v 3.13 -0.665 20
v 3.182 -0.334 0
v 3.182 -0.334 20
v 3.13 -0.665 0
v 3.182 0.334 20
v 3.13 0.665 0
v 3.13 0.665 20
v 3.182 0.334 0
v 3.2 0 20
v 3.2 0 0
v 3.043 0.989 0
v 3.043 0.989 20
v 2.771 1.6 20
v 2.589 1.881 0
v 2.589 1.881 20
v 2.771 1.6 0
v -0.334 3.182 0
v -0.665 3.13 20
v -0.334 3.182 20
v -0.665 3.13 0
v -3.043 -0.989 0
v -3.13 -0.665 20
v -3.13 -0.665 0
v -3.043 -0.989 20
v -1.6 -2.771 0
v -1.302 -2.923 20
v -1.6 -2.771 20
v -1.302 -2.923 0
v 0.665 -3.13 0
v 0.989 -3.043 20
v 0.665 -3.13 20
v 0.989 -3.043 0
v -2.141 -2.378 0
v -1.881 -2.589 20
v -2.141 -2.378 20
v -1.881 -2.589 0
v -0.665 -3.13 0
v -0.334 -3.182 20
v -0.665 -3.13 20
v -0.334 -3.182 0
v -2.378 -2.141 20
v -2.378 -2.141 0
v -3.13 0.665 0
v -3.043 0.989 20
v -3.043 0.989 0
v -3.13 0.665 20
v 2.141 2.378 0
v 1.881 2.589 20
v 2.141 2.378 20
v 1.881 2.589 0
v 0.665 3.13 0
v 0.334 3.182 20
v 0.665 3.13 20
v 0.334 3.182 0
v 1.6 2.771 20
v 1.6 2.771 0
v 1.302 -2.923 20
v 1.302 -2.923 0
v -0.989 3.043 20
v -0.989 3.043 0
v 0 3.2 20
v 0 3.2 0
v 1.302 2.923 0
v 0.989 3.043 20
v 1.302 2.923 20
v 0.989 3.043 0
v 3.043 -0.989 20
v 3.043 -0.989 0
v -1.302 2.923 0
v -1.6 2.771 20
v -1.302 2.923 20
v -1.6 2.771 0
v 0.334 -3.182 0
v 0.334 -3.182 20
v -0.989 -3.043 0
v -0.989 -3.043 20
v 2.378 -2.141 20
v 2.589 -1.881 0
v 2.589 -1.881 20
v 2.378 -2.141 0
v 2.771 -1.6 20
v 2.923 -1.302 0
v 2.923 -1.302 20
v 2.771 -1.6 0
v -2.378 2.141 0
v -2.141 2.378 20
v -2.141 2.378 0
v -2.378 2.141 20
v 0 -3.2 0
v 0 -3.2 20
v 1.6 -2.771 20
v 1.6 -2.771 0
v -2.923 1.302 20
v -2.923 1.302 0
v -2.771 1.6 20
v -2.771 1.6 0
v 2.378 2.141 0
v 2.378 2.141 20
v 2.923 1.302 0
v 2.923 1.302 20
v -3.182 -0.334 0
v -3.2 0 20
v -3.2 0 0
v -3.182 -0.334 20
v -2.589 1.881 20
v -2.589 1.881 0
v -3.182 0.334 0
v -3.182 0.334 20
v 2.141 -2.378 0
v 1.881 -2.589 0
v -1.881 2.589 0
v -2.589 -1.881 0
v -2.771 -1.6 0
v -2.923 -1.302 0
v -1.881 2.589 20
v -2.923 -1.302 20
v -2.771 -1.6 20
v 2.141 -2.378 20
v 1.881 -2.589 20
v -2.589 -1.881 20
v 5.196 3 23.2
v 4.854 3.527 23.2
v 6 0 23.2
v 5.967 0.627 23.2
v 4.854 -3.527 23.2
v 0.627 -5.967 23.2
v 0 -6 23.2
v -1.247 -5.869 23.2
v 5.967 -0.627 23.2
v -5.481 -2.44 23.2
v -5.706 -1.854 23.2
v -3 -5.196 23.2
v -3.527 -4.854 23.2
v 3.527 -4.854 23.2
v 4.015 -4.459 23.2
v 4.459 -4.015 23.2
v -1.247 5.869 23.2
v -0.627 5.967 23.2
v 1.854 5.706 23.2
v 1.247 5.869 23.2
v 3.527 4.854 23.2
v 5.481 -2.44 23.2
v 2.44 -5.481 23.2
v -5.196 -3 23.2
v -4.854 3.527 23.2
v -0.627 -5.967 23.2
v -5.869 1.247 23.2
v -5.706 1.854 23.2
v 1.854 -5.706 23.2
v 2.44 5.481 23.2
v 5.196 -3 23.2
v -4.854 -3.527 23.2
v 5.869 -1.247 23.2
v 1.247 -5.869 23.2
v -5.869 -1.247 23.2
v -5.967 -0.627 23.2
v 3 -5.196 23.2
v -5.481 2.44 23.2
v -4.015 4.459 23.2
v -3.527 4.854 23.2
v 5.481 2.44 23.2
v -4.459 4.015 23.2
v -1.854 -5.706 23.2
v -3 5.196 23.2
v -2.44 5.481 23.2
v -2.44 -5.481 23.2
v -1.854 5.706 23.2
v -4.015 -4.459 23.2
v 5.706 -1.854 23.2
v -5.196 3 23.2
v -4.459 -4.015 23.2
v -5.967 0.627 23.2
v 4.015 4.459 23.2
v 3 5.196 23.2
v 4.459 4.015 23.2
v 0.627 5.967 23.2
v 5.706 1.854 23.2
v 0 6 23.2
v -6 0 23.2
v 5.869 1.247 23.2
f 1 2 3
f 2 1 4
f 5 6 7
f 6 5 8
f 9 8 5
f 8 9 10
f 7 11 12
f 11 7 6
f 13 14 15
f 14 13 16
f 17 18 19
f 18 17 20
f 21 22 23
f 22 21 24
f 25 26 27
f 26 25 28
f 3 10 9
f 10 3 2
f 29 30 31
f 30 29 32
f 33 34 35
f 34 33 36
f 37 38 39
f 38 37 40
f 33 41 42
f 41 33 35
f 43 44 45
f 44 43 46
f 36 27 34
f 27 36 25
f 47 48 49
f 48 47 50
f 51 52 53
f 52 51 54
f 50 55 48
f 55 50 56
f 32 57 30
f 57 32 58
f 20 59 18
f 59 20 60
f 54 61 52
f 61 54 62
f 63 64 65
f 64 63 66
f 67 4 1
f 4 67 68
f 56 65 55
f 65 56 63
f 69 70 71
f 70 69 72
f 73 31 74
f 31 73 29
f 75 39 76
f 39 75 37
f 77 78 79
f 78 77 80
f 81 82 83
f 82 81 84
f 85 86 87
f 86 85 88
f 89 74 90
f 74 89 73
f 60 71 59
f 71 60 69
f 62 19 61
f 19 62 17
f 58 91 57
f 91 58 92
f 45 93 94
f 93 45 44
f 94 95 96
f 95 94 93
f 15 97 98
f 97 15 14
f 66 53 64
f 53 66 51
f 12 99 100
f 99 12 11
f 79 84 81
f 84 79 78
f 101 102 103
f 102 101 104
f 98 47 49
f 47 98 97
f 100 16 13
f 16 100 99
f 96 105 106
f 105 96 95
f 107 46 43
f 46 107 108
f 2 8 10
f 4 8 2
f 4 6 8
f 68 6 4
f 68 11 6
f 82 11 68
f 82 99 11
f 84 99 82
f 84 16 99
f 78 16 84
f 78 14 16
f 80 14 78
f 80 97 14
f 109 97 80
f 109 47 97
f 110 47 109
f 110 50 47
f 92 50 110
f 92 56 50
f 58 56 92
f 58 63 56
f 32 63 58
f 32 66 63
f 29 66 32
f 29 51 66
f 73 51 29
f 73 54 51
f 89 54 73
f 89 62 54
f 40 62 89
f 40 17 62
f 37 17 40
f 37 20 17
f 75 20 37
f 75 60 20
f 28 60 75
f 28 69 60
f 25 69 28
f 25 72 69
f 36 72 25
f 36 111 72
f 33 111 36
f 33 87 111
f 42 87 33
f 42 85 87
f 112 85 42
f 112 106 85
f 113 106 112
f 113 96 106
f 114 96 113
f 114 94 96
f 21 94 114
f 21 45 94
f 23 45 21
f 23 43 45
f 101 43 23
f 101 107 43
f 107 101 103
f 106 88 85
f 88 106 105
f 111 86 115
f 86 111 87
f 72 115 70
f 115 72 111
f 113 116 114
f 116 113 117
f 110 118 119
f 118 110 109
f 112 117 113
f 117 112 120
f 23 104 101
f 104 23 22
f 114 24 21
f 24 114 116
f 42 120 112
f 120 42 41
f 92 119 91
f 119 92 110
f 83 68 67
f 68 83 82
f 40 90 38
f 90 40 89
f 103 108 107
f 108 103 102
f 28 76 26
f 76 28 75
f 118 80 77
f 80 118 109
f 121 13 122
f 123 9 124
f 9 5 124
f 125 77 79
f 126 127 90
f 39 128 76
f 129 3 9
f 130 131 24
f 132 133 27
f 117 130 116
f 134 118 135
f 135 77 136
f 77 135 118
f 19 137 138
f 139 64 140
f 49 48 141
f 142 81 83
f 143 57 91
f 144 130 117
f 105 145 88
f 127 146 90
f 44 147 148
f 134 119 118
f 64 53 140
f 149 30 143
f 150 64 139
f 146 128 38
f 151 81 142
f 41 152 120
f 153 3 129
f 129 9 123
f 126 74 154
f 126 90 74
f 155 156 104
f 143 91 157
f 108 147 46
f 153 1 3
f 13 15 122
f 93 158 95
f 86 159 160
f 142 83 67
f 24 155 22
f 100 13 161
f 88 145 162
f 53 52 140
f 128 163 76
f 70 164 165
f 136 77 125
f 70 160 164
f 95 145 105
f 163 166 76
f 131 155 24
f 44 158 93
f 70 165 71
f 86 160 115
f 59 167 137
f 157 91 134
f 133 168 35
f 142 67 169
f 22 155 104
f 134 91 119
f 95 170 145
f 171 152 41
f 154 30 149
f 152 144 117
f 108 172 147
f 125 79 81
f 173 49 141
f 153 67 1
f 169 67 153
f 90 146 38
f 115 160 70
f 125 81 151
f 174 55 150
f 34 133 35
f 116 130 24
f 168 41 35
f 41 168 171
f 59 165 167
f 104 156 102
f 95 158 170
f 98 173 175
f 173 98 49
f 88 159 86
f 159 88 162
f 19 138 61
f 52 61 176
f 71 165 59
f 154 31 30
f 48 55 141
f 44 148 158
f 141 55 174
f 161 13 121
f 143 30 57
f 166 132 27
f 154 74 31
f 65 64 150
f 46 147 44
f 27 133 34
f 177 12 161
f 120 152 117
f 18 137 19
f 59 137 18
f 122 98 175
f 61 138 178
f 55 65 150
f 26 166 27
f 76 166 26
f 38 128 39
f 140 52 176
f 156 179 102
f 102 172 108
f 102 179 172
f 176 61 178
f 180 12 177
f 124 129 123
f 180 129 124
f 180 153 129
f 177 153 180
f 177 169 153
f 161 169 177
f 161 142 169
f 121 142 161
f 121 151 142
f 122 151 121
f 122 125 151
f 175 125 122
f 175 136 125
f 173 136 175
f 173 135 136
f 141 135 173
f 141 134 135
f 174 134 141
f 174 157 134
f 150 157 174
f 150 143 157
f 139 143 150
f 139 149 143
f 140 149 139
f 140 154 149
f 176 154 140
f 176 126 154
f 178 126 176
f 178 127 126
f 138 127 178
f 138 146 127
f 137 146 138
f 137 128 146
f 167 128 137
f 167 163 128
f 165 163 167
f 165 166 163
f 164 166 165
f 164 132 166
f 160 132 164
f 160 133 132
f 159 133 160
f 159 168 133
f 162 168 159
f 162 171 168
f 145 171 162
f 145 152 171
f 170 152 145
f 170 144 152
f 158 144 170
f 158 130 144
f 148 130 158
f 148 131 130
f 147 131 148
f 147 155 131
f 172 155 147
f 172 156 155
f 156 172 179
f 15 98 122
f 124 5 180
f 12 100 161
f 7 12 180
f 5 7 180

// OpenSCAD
// Countersunk screw with 90-degree conical head.
$fn = 60;
eps = 0.02;
shaft_d = 6.4;
head_d = 12;
head_h = 3.2;
shaft_l = 20;
union() {
    cylinder(d = shaft_d, h = shaft_l);
    translate([0, 0, shaft_l]) cylinder(d1 = shaft_d, d2 = head_d, h = head_h);
}
